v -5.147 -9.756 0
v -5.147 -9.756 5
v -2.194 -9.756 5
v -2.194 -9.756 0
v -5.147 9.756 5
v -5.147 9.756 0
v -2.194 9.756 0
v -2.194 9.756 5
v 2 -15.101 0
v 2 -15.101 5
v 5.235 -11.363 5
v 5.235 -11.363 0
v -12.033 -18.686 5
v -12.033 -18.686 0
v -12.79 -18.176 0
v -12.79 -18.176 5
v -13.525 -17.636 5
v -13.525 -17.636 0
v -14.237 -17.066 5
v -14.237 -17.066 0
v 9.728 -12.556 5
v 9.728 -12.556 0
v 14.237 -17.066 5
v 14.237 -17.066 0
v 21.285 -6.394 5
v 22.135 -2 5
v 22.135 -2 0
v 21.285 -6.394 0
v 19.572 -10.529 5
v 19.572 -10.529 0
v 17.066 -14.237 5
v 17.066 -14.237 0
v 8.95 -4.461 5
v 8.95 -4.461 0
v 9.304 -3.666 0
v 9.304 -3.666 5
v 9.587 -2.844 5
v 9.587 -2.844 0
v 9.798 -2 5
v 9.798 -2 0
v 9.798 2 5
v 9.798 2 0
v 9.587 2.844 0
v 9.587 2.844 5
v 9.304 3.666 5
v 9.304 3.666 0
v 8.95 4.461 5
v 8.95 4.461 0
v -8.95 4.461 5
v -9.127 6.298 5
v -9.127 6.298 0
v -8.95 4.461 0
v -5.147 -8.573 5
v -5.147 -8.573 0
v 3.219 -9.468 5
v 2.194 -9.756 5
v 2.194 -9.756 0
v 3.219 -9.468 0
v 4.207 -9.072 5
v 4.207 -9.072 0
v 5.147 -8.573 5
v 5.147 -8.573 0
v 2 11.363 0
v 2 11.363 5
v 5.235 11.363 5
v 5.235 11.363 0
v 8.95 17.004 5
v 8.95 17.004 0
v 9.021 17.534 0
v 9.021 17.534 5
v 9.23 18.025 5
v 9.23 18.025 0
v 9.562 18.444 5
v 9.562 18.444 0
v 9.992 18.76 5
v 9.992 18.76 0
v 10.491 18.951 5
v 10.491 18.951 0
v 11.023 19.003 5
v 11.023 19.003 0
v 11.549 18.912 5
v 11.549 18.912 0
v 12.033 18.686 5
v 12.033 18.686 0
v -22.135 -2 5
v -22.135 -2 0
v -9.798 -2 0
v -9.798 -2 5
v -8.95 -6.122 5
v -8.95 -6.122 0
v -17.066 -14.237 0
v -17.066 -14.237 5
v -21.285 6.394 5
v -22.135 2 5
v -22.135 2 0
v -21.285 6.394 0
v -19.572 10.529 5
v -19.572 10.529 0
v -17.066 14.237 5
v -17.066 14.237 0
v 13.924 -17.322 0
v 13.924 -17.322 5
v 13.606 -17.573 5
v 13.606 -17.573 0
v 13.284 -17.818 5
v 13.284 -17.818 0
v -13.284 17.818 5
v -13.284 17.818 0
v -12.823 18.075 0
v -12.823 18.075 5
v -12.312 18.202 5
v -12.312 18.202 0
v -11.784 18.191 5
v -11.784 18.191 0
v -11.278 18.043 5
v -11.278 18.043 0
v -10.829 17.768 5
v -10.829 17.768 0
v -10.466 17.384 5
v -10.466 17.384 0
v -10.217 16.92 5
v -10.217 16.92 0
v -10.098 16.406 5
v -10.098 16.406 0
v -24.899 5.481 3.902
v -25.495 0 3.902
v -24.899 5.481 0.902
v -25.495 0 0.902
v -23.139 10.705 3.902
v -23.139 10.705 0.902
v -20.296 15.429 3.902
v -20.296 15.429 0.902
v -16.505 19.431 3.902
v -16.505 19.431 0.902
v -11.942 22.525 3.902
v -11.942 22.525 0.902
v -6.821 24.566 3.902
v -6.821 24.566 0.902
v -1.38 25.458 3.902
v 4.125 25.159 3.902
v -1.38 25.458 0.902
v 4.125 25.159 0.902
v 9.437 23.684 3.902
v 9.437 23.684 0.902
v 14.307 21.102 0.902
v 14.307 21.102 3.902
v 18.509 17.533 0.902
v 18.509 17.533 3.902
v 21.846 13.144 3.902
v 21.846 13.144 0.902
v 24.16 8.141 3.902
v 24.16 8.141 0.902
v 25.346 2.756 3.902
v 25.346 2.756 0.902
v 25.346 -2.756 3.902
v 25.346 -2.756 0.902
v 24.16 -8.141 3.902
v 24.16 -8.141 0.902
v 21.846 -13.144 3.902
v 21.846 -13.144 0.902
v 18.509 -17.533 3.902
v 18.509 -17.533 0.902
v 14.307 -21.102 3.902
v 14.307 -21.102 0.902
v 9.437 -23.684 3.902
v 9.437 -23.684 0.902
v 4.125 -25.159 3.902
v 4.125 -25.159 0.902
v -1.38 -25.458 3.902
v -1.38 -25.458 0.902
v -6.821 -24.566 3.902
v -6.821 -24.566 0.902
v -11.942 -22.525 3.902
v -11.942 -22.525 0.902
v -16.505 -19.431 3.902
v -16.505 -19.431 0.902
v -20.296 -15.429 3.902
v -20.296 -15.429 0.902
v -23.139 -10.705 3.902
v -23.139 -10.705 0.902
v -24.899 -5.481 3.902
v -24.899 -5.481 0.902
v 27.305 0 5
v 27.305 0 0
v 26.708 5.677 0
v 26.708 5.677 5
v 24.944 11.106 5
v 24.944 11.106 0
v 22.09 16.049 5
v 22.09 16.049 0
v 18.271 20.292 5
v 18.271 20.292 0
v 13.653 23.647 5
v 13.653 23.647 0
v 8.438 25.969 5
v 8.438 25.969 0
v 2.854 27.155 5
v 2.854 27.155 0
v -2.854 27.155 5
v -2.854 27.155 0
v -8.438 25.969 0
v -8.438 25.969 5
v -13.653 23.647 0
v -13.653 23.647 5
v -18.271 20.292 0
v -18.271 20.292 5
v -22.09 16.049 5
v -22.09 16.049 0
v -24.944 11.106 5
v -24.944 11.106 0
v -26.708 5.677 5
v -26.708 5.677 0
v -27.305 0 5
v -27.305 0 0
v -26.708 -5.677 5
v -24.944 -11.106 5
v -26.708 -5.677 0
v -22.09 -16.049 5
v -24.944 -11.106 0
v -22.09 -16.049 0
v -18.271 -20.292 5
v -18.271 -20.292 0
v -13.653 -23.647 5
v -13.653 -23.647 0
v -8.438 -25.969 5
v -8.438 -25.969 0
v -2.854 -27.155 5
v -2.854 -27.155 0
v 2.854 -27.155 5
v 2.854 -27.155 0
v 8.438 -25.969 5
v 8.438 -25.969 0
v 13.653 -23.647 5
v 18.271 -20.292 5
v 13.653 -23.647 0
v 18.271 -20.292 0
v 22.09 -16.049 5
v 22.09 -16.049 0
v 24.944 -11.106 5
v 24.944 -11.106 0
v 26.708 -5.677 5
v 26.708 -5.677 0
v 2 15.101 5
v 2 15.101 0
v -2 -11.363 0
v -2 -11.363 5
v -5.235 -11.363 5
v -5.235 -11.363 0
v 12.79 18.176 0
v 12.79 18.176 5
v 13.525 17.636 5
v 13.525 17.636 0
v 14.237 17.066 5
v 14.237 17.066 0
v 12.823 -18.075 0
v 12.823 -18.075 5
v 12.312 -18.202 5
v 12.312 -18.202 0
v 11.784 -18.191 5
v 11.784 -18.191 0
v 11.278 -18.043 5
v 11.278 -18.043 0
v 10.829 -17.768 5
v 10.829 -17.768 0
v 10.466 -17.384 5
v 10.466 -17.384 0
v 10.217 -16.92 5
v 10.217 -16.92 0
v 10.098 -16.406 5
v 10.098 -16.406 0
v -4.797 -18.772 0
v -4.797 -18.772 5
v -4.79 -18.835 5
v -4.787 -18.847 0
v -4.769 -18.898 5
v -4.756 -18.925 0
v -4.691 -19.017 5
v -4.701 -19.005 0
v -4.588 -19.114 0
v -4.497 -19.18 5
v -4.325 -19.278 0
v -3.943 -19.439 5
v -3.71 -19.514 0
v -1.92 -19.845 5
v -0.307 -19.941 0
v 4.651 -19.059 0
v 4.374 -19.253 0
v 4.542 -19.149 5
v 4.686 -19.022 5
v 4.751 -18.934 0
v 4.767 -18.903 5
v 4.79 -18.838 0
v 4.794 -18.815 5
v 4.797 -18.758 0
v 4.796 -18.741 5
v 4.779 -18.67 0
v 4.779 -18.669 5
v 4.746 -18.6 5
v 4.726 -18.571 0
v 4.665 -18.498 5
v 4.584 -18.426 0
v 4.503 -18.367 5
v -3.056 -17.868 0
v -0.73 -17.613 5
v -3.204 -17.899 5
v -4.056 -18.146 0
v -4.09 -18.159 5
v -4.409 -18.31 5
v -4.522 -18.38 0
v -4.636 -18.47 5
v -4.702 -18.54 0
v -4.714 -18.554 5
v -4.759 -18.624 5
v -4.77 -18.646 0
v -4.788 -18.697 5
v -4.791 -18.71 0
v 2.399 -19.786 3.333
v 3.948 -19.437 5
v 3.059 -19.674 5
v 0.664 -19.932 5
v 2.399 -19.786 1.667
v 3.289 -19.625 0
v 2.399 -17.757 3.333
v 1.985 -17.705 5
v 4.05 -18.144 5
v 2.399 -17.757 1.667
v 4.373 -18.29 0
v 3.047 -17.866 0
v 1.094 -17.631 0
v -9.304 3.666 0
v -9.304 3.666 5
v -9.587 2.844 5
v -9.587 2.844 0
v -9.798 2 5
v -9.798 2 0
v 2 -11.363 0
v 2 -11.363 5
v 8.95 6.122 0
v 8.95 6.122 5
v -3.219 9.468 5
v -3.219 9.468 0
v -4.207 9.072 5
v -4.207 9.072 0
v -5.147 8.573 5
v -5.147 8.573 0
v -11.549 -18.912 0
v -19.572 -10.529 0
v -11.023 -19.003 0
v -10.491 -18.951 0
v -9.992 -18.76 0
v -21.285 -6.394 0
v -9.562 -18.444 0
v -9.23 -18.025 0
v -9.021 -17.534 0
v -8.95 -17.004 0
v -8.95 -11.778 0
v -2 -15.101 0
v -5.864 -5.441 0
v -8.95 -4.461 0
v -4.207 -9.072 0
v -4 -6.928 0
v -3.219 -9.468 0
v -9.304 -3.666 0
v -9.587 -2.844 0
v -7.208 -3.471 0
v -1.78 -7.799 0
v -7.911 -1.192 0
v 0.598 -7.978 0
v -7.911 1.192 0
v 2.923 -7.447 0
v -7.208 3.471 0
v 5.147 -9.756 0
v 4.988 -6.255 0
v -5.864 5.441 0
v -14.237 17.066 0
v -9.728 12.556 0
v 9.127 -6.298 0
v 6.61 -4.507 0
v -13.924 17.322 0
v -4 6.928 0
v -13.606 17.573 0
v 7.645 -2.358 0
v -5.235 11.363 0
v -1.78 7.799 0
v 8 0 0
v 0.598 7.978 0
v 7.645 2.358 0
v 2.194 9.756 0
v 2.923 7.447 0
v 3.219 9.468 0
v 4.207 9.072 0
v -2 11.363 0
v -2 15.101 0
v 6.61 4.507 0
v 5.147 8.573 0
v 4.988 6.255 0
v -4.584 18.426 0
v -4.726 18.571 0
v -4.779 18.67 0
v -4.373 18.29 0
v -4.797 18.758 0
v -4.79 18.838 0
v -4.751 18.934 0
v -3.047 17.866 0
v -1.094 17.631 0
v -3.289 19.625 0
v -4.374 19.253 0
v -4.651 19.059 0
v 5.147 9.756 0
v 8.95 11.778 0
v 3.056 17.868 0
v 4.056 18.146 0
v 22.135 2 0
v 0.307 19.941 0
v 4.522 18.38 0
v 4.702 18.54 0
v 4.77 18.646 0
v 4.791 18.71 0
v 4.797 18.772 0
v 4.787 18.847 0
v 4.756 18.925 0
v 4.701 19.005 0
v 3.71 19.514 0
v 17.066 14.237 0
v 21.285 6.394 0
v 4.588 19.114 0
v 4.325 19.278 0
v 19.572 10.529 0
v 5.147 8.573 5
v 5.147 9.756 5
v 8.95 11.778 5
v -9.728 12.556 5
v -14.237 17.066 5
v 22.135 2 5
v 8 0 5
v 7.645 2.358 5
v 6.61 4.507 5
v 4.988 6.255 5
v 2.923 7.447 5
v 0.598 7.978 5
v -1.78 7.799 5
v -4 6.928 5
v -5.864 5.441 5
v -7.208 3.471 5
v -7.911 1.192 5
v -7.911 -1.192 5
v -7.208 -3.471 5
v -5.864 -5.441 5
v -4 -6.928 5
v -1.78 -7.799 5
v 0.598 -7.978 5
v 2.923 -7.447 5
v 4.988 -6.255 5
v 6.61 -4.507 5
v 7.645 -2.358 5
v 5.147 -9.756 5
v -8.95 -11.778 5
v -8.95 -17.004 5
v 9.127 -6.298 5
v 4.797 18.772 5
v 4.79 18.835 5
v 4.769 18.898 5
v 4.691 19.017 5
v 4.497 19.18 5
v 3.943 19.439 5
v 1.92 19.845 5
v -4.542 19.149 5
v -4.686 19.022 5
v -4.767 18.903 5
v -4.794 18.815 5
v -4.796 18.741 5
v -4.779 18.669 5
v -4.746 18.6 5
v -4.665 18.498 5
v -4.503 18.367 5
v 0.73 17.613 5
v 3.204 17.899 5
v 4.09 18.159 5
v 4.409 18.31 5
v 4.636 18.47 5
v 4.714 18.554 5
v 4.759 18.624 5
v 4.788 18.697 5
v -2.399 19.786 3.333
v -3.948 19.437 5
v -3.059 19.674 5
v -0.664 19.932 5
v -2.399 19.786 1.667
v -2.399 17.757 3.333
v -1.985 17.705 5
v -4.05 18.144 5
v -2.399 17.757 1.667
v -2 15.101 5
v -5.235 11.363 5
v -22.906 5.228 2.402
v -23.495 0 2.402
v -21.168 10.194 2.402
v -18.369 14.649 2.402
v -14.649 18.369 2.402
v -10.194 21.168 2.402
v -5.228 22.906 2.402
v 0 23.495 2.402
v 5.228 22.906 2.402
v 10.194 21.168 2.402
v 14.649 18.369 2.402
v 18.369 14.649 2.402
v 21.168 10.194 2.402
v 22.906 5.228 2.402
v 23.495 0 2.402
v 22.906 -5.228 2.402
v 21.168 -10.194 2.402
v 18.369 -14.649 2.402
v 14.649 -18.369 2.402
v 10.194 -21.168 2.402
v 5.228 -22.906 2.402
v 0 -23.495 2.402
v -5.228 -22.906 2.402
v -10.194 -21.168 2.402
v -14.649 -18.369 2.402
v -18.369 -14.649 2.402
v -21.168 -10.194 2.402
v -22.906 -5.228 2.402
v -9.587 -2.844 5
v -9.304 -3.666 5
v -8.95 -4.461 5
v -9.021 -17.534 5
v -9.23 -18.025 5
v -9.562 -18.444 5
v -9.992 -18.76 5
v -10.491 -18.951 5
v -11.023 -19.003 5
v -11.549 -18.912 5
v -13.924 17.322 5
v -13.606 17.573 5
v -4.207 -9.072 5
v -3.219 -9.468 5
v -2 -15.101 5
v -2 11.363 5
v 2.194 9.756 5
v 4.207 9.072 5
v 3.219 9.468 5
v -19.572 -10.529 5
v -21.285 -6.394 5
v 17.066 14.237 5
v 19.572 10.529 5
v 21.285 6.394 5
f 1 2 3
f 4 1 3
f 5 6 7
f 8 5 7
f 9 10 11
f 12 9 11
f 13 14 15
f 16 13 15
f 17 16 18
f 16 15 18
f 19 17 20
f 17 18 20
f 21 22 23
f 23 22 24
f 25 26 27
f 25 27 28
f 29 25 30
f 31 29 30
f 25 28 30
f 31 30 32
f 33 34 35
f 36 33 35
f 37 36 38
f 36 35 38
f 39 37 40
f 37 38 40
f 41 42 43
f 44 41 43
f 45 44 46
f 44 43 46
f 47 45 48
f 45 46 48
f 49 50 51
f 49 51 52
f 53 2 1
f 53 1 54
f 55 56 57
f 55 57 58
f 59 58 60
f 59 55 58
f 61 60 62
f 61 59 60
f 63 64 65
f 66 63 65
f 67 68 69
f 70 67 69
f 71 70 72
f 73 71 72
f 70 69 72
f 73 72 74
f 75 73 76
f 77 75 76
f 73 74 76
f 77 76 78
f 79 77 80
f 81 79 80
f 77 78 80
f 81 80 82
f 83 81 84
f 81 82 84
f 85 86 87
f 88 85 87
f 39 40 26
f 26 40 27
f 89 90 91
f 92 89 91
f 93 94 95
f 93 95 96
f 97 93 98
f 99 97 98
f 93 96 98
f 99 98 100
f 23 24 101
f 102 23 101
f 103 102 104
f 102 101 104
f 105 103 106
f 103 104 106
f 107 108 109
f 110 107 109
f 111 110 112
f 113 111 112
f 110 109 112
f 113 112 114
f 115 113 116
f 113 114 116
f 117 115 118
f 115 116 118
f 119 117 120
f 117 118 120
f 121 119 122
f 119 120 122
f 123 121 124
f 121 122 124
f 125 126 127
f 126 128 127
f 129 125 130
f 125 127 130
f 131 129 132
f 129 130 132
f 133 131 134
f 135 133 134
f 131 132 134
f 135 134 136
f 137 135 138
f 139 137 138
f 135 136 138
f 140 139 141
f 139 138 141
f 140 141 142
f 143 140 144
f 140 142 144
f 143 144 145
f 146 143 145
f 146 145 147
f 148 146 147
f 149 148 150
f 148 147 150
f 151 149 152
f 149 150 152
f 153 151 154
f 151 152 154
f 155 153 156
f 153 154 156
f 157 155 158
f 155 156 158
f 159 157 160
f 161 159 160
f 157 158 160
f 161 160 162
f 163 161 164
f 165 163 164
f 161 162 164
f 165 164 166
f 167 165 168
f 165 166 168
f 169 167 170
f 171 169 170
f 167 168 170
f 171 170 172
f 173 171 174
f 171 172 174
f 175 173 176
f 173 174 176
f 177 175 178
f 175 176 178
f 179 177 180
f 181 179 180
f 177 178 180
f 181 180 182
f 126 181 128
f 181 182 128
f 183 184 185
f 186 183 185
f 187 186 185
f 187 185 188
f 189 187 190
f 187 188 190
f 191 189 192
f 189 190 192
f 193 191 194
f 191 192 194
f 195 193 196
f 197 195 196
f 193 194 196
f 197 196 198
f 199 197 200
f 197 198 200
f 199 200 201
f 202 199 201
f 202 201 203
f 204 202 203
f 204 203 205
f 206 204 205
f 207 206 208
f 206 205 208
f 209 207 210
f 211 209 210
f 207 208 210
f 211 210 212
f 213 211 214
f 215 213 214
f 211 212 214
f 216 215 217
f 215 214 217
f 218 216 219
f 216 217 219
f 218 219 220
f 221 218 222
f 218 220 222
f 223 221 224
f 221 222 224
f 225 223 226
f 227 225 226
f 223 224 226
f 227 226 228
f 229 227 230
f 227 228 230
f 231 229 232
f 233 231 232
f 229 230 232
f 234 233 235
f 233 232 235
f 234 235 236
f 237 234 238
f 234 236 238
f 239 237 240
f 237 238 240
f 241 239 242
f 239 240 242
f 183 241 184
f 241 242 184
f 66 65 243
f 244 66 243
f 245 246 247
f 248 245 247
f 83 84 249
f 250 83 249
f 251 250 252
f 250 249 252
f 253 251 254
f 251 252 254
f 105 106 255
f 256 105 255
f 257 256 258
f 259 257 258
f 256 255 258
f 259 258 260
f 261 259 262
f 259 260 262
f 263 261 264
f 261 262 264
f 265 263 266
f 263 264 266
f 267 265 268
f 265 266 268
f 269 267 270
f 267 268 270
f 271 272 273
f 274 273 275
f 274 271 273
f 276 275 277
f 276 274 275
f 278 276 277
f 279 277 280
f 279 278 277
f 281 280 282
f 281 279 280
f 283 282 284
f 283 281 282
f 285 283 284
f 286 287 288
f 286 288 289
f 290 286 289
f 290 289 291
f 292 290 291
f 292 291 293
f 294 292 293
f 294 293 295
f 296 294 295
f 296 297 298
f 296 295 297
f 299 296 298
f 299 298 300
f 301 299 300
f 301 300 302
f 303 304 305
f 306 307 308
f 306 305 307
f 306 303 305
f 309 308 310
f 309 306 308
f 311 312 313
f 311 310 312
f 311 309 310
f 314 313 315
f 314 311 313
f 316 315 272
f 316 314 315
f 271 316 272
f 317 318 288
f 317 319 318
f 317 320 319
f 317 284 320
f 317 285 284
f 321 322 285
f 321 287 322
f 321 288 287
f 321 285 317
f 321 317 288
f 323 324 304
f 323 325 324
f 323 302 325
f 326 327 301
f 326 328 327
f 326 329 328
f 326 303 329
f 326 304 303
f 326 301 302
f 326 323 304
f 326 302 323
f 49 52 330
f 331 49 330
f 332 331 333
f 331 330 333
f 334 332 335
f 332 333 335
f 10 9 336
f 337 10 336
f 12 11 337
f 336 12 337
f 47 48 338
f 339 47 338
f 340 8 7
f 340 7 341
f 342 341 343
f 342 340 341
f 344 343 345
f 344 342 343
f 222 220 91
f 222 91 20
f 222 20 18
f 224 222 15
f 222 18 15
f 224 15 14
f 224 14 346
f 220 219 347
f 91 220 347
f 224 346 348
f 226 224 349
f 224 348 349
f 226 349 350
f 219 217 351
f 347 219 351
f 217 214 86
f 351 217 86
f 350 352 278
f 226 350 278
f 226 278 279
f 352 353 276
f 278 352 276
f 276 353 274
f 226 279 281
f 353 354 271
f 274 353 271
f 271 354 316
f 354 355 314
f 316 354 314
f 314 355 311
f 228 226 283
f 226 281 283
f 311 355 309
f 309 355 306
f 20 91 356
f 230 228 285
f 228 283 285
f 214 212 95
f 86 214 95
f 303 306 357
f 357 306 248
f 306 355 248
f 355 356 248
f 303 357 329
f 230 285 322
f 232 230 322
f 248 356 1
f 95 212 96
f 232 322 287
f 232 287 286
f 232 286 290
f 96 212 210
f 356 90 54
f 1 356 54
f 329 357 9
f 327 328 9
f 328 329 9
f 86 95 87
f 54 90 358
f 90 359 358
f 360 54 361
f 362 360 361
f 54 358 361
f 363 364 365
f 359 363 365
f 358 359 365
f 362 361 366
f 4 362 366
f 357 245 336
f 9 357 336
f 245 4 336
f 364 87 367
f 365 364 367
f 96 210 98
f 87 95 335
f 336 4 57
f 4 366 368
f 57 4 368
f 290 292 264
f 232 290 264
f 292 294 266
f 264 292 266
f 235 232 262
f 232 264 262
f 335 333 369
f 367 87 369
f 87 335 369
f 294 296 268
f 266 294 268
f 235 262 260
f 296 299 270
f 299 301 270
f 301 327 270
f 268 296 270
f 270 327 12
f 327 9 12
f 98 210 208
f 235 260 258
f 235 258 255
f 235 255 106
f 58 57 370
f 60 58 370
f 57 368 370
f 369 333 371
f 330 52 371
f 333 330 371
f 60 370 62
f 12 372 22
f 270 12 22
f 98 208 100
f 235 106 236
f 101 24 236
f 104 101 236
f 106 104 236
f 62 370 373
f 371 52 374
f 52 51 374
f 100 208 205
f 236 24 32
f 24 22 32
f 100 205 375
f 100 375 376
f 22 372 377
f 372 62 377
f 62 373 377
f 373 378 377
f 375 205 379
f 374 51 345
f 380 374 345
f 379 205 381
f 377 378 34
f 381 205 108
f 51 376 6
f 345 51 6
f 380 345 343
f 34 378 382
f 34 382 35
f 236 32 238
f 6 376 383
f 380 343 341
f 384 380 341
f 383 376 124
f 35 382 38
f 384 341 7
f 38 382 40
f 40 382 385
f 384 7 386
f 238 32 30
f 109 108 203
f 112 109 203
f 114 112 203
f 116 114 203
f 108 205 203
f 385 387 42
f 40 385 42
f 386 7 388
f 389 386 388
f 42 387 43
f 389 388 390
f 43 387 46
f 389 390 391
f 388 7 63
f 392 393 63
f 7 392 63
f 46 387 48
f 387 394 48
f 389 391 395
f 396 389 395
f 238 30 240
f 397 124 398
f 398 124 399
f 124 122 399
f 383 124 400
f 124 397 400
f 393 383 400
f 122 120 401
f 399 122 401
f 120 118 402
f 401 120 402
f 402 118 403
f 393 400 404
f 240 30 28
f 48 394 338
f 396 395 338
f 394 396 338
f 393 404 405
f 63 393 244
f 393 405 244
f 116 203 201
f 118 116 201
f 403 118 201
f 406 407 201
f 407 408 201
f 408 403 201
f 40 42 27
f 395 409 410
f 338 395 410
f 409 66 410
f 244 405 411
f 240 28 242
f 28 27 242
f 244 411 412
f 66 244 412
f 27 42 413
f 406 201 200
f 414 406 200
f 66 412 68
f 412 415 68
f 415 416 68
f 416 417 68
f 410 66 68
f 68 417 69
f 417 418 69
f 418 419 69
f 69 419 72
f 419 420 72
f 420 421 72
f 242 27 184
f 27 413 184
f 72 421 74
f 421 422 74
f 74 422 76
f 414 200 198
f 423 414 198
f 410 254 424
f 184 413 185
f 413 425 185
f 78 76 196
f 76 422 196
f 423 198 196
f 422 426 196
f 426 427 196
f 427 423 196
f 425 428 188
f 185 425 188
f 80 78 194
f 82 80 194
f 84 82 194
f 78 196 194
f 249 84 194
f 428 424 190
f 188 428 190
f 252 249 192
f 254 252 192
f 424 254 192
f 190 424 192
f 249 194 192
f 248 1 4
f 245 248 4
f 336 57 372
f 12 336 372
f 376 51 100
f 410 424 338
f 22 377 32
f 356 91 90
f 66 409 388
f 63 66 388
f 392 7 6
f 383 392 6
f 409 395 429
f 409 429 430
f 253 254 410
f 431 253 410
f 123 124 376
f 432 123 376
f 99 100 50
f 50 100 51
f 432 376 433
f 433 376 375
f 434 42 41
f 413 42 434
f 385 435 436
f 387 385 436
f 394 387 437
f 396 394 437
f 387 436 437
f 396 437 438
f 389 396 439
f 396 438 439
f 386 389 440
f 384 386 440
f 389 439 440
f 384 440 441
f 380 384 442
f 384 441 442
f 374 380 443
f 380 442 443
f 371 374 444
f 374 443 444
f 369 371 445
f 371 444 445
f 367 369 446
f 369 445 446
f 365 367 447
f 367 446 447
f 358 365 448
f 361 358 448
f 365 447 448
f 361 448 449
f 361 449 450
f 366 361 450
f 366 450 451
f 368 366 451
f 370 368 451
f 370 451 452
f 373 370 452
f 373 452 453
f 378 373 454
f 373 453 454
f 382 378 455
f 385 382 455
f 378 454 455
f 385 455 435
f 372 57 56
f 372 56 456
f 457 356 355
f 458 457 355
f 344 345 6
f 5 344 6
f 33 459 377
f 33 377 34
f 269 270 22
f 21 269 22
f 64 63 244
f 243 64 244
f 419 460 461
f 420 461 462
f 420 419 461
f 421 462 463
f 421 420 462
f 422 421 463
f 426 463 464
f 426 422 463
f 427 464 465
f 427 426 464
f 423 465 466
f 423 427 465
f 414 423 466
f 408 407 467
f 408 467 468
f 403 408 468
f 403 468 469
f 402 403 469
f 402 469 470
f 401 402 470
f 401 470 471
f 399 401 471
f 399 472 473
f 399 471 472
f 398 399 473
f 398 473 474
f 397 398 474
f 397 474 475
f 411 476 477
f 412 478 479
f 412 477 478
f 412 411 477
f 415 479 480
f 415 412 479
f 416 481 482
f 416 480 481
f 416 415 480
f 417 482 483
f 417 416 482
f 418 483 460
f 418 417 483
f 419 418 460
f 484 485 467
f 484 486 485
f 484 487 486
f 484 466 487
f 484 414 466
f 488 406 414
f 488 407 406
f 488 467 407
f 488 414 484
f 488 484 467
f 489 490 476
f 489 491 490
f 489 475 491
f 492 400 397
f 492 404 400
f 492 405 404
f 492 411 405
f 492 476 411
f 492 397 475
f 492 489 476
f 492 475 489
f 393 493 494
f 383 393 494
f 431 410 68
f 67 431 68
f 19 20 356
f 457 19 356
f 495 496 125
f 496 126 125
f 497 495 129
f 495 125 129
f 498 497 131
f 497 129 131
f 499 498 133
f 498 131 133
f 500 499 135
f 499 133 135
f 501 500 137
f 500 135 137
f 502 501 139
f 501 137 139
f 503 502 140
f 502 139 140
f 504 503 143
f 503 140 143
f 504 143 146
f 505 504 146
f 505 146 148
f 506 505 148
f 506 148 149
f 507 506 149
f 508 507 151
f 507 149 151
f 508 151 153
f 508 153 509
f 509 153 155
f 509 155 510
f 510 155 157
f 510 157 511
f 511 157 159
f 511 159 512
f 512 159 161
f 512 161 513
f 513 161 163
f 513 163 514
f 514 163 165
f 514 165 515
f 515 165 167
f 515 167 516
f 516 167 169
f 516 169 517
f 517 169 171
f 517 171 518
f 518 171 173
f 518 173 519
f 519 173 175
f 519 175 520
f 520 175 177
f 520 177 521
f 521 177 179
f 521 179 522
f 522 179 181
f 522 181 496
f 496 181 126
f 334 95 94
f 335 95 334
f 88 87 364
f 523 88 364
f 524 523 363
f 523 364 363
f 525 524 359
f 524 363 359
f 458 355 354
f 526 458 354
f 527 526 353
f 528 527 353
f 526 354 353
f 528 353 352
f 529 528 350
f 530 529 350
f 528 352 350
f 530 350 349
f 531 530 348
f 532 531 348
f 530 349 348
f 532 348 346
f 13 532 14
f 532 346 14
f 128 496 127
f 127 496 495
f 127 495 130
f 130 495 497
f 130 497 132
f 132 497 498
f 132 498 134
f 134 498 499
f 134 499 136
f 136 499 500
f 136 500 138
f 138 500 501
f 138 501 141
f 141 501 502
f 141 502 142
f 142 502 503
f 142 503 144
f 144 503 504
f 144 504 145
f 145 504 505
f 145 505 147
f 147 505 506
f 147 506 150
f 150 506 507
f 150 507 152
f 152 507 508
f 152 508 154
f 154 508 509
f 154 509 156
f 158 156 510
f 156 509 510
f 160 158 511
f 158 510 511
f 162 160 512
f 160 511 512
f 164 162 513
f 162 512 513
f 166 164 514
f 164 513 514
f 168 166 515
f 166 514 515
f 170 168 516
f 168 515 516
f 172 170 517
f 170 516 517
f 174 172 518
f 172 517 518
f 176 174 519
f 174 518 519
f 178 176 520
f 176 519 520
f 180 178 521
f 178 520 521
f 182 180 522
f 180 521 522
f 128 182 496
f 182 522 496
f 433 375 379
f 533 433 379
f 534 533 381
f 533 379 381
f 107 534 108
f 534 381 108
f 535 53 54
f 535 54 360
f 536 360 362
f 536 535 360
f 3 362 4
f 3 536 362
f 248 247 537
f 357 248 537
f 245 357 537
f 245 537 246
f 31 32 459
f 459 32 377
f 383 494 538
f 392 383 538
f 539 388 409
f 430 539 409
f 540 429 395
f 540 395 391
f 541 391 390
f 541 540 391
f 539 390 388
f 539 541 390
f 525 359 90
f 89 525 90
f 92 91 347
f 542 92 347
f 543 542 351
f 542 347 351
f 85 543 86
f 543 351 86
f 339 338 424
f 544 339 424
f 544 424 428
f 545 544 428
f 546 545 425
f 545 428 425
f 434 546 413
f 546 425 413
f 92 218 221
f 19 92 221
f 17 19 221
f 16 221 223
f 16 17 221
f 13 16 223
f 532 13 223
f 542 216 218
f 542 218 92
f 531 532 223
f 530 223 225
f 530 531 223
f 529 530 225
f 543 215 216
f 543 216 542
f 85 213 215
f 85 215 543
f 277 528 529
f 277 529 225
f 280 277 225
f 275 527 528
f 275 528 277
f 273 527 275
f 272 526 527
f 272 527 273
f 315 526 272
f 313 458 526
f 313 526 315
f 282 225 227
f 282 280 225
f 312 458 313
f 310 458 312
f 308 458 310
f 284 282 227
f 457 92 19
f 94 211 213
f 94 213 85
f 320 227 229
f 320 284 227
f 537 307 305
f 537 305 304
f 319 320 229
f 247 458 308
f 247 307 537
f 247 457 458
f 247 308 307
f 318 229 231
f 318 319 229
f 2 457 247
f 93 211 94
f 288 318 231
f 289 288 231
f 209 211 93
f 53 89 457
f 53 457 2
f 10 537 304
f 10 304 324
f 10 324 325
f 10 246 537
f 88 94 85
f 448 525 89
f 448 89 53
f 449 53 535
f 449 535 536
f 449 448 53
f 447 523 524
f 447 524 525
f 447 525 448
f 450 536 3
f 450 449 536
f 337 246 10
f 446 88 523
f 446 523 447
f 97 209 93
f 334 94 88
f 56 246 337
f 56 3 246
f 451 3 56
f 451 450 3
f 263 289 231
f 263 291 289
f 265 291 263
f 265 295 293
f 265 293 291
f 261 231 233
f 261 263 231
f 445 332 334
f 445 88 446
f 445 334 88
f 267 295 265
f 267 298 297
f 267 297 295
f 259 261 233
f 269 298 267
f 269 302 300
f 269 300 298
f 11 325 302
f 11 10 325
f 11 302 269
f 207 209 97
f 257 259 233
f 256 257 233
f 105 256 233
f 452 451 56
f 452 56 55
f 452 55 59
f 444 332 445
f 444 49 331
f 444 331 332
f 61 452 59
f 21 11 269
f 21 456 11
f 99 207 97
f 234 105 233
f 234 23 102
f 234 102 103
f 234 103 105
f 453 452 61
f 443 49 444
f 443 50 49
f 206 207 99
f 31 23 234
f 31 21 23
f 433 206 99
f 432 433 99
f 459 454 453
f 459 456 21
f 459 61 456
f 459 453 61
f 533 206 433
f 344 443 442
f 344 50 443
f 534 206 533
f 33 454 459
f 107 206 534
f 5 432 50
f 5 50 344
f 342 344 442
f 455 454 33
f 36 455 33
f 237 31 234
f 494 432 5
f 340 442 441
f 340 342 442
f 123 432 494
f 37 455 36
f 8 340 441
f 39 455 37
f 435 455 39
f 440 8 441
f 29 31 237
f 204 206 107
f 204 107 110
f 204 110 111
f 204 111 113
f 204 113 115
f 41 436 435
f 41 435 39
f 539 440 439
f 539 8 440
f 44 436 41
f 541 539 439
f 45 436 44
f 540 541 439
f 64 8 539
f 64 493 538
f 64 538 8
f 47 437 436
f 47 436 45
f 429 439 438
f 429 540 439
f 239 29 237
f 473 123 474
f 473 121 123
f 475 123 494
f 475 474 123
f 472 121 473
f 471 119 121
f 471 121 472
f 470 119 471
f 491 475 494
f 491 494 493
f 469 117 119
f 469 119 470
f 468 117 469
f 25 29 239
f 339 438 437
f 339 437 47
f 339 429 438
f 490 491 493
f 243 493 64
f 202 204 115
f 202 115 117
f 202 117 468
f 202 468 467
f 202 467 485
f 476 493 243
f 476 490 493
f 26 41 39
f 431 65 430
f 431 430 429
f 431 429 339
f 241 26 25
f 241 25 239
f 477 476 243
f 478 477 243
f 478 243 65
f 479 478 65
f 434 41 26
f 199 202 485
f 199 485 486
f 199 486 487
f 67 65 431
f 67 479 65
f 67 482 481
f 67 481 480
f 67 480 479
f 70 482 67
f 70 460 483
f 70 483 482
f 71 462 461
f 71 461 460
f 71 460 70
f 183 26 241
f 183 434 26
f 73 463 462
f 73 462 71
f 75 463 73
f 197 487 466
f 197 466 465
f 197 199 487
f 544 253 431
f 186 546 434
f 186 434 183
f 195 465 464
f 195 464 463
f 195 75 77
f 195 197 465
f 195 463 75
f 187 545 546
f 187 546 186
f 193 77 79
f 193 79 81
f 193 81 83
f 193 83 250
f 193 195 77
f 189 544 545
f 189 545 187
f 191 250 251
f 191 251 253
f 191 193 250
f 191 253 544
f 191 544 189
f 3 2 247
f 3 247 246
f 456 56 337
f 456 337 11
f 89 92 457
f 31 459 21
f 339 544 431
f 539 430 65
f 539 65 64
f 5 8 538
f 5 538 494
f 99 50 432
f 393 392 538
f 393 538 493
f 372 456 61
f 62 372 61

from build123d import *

# Parameters (mm, degrees)
F0_R      = 27.305
F0_R_2    = 3.125
F1_DEPTH  = 5
F2_R      = 7.5
F2_R_2    = 3.125
F3_DEPTH  = 4
F4_R      = 6.096
F7_DEPTH  = 5.001
F10_R     = 0.662213
F11_DEPTH = 9.001
F12_W     = 13.650434
F12_H     = 4
F12_W_2   = 4
F12_H_2   = 13.650434
F13_DEPTH = 5
F15_DEPTH = 12.7
F16_W     = 10.29484
F16_H     = 1.244958
F17_DEPTH = 12.7
F18_R     = 8
F19_DEPTH = 12.7
F20_R     = 8
F21_DEPTH = 5


with BuildPart() as f1:
    # F0 (on Top) → F1 (new body)
    with BuildSketch(Plane.XY):
        Circle(F0_R)
        with BuildLine():
            Line((-10.097842, 16.405938), (-8.950036, 4.46059))
            ThreePointArc((-8.950036, 4.46059), (-10, 0), (-8.950036, -4.46059))
            Line((-8.950036, -4.46059), (-8.950036, -17.004333))
            ThreePointArc((-8.950036, -17.004333), (-9.992342, -18.76013), (-12.032858, -18.685849))
            ThreePointArc((-12.032858, -18.685849), (-22.211956, -0.761352), (-13.284091, 17.818068))
            ThreePointArc((-13.284091, 17.818068), (-11.278303, 18.043112), (-10.097842, 16.405938))
        make_face(mode=Mode.SUBTRACT)
        Circle(F0_R_2, mode=Mode.SUBTRACT)
        with BuildLine():
            Line((8.950036, 4.46059), (8.950036, 17.004333))
            ThreePointArc((8.950036, 17.004333), (9.992342, 18.76013), (12.032858, 18.685849))
            ThreePointArc((12.032858, 18.685849), (22.211956, 0.761352), (13.284091, -17.818068))
            ThreePointArc((13.284091, -17.818068), (11.278303, -18.043112), (10.097842, -16.405938))
            Line((10.097842, -16.405938), (8.950036, -4.46059))
            ThreePointArc((8.950036, -4.46059), (10, 0), (8.950036, 4.46059))
        make_face(mode=Mode.SUBTRACT)
    extrude(amount=F1_DEPTH)

    # F2 (on face) → F3 (join)
    with BuildSketch(Plane.XY.offset(5)):
        Circle(F2_R)
        Circle(F2_R_2, mode=Mode.SUBTRACT)
    extrude(amount=F3_DEPTH)

    # F4 (on Front) → F5 (revolve, cut)
    with BuildSketch(Plane.XZ):
        with Locations((-9.469913, 12.312098)):
            Circle(F4_R)
    revolve(axis=Axis((0, 0, 5.050069), (0, 0, -1)), mode=Mode.SUBTRACT)

    # F6 (on face) → F7 (cut, through all)
    with BuildSketch(Plane.XY.offset(5)):
        Polygon((0, 17.41166), (0, 11.362989), (5.234685, 11.362989), align=None)
        Polygon((-5.234685, 11.362989), (0, 11.362989), (0, 17.41166), align=None)
        Polygon((0, -11.362989), (-5.234685, -11.362989), (0, -17.41166), (5.234685, -11.362989), align=None)
    extrude(amount=-F7_DEPTH, mode=Mode.SUBTRACT)

    # F8 (on Front) → F9 (revolve, cut)
    with BuildSketch(Plane.XZ):
        Polygon((-25.495, 3.902024), (-25.495, 2.402024), (-23.495, 2.402024), align=None)
        Polygon((-23.495, 2.402024), (-25.495, 2.402024), (-25.495, 0.902024), align=None)
    revolve(axis=Axis((0, 0, 20.538263), (0, 0, -1)), mode=Mode.SUBTRACT)

    # F10 (on face) → F11 (cut, through all)
    with BuildSketch(Plane.XY):
        with Locations((0, 5.743192)):
            Circle(F10_R)
        with Locations((-4.06105, 4.06105)):
            Circle(F10_R)
        with Locations((-5.743192, 0)):
            Circle(F10_R)
        with Locations((-4.06105, -4.06105)):
            Circle(F10_R)
        with Locations((0, -5.743192)):
            Circle(F10_R)
        with Locations((4.06105, -4.06105)):
            Circle(F10_R)
        with Locations((5.743192, 0)):
            Circle(F10_R)
        with Locations((4.06105, 4.06105)):
            Circle(F10_R)
    extrude(amount=F11_DEPTH, mode=Mode.SUBTRACT)

    # F12 (on Top) → F13 (join)
    with BuildSketch(Plane.XY):
        with Locations((-15.625295, 0)):
            Rectangle(F12_W, F12_H)
        Polygon((-14.460696, -17.289123), (-4.808381, -7.636809), (-7.636809, -4.808381), (-17.289123, -14.460696), align=None)
        with Locations((0, -15.625295)):
            Rectangle(F12_W_2, F12_H_2)
        Polygon((17.289123, -14.460696), (7.636809, -4.808381), (4.808381, -7.636809), (14.460696, -17.289123), align=None)
        with Locations((15.625295, 0)):
            Rectangle(F12_W, F12_H)
        Polygon((14.460696, 17.289123), (4.808381, 7.636809), (7.636809, 4.808381), (17.289123, 14.460696), align=None)
        with Locations((0, 15.625295)):
            Rectangle(F12_W_2, F12_H_2)
        Polygon((-17.289123, 14.460696), (-7.636809, 4.808381), (-4.808381, 7.636809), (-14.460696, 17.289123), align=None)
    extrude(amount=F13_DEPTH)

    # F14 (on Top) → F15 (cut, symmetric)
    with BuildSketch(Plane.XY):
        with BuildLine():
            add(Edge.make_bspline(
                [(4.797351, 18.771529), (4.797351, 20.801119), (-2.398675, 19.786324), (-9.594701, 18.771529), (-2.398675, 17.756734), (4.797351, 16.74194), (4.797351, 18.771529)],
                knots=[0, 0, 0, 2.094395, 2.094395, 4.18879, 4.18879, 6.283185, 6.283185, 6.283185], degree=2, weights=[1, 0.5, 1, 0.5, 1, 0.5, 1]))
        make_face()
        with BuildLine():
            add(Edge.make_bspline(
                [(-4.797351, -18.771529), (-4.797351, -20.801119), (2.398675, -19.786324), (9.594701, -18.771529), (2.398675, -17.756734), (-4.797351, -16.74194), (-4.797351, -18.771529)],
                knots=[0, 0, 0, 2.094395, 2.094395, 4.18879, 4.18879, 6.283185, 6.283185, 6.283185], degree=2, weights=[1, 0.5, 1, 0.5, 1, 0.5, 1]))
        make_face()
    extrude(amount=F15_DEPTH, both=True, mode=Mode.SUBTRACT)

    # F16 (on Top) → F17 (cut, symmetric)
    with BuildSketch(Plane.XY):
        with Locations((0, 9.133866)):
            Rectangle(F16_W, F16_H)
        with Locations((0, -9.133866)):
            Rectangle(F16_W, F16_H)
    extrude(amount=F17_DEPTH, both=True, mode=Mode.SUBTRACT)

    # F18 (on face) → F19 (cut, symmetric)
    with BuildSketch(Plane.XY.offset(5)):
        Circle(F18_R)
    extrude(amount=F19_DEPTH, both=True, mode=Mode.SUBTRACT)

    # F20 (on face) → F21 (join)
    with BuildSketch(Plane.XY.offset(5)):
        with BuildLine():
            ThreePointArc((-2.194021, -9.756345), (0, -10), (2.194021, -9.756345))
            Line((2.194021, -9.756345), (-2.194021, -9.756345))
        make_face()
        with BuildLine():
            Line((5.14742, 8.511387), (5.14742, 8.573451))
            ThreePointArc((5.14742, 8.573451), (3.718064, 9.283103), (2.194021, 9.756345))
            Line((2.194021, 9.756345), (-2.194021, 9.756345))
            ThreePointArc((-2.194021, 9.756345), (-3.718064, 9.283103), (-5.14742, 8.573451))
            Line((-5.14742, 8.573451), (-5.14742, 8.511387))
            Line((-5.14742, 8.511387), (5.14742, 8.511387))
        make_face()
        with BuildLine():
            ThreePointArc((9.797959, -2), (9.949362, -1.00509), (10, 0))
            ThreePointArc((10, 0), (9.949362, 1.00509), (9.797959, 2))
            ThreePointArc((9.797959, 2), (9.454388, 3.257998), (8.950036, 4.46059))
            ThreePointArc((8.950036, 4.46059), (7.342579, 6.788706), (5.14742, 8.573451))
            Line((5.14742, 8.573451), (5.14742, 8.511387))
            Line((5.14742, 8.511387), (-5.14742, 8.511387))
            Line((-5.14742, 8.511387), (-5.14742, 8.573451))
            ThreePointArc((-5.14742, 8.573451), (-7.342579, 6.788706), (-8.950036, 4.46059))
            ThreePointArc((-8.950036, 4.46059), (-9.454388, 3.257998), (-9.797959, 2))
            ThreePointArc((-9.797959, 2), (-10, 0), (-9.797959, -2))
            ThreePointArc((-9.797959, -2), (-9.454388, -3.257998), (-8.950036, -4.46059))
            ThreePointArc((-8.950036, -4.46059), (-7.342579, -6.788706), (-5.14742, -8.573451))
            Line((-5.14742, -8.573451), (-5.14742, -8.511387))
            Line((-5.14742, -8.511387), (5.14742, -8.511387))
            Line((5.14742, -8.511387), (5.14742, -8.573451))
            ThreePointArc((5.14742, -8.573451), (7.342579, -6.788706), (8.950036, -4.46059))
            ThreePointArc((8.950036, -4.46059), (9.454388, -3.257998), (9.797959, -2))
        make_face()
        Circle(F20_R, mode=Mode.SUBTRACT)
        with BuildLine():
            ThreePointArc((2.194021, -9.756345), (3.718064, -9.283103), (5.14742, -8.573451))
            Line((5.14742, -8.573451), (5.14742, -8.511387))
            Line((5.14742, -8.511387), (-5.14742, -8.511387))
            Line((-5.14742, -8.511387), (-5.14742, -8.573451))
            ThreePointArc((-5.14742, -8.573451), (-3.718064, -9.283103), (-2.194021, -9.756345))
            Line((-2.194021, -9.756345), (2.194021, -9.756345))
        make_face()
        with BuildLine():
            Line((-2.194021, 9.756345), (2.194021, 9.756345))
            ThreePointArc((2.194021, 9.756345), (0, 10), (-2.194021, 9.756345))
        make_face()
    extrude(amount=-F21_DEPTH)


solid = f1.part
